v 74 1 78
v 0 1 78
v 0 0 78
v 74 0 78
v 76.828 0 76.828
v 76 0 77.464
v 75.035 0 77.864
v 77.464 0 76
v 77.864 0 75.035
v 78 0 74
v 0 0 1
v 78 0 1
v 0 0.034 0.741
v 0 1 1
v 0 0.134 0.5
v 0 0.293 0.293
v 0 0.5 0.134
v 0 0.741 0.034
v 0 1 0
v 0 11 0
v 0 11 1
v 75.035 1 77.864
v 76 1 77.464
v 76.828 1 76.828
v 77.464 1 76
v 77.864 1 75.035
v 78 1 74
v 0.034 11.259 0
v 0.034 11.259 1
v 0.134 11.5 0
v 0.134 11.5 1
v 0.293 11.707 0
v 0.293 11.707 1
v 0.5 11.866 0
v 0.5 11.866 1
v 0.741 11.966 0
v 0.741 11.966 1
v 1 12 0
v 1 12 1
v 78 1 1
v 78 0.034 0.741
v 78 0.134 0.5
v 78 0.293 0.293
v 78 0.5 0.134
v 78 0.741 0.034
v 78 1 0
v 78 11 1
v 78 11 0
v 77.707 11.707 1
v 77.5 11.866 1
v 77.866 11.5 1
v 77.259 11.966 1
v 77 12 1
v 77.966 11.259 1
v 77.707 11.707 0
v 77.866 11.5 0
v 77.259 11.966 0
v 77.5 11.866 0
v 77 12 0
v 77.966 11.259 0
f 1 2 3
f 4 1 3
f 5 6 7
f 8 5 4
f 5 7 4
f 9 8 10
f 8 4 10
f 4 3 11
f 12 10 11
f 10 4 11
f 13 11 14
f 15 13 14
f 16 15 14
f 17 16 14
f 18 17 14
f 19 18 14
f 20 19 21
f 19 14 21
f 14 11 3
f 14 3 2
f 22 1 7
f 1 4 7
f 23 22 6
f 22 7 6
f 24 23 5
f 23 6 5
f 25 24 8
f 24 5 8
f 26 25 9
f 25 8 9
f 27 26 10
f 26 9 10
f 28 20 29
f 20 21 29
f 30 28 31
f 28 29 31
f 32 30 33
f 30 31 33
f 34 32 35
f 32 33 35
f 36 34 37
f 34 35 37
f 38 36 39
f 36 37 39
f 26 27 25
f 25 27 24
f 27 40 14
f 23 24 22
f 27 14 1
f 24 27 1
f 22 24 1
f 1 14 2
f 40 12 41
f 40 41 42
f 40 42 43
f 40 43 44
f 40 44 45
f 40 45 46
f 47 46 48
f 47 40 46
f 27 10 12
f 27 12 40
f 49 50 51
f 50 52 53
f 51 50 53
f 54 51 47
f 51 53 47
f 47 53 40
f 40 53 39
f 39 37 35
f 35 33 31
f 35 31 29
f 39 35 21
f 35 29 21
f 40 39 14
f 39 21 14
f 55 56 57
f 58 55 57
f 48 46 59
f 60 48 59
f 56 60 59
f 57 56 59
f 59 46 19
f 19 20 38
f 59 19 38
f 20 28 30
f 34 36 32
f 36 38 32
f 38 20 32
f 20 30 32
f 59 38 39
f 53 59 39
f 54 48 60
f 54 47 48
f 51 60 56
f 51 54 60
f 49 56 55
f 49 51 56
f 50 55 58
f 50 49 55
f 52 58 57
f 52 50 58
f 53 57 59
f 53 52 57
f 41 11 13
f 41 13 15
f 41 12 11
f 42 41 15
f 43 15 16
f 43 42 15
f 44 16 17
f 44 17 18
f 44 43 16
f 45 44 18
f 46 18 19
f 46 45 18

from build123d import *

# Parameters (mm, degrees)
F1_DEPTH = 78
F2_R     = 4
F3_R     = 1


# Not quite as in the source:
# - two fillets or chamfers of one size are made in one step


with BuildPart() as f1:
    # F0 (on Right) → F1 (new body)
    with BuildSketch(Plane.YZ):
        Polygon((0, 78), (0, 0), (12, 0), (12, 1), (1, 1), (1, 78), align=None)
    extrude(amount=F1_DEPTH)

    # F2
    f2_edges = [f1.edges().sort_by_distance(p)[0] for p in [
        (78, 0.5, 78),
    ]]
    fillet(f2_edges, radius=F2_R)

    # F3
    f3_edges = [f1.edges().sort_by_distance(p)[0] for p in [
        (0, 12, 0.5),
        (39, 0, 0),
        (78, 12, 0.5),
    ]]
    fillet(f3_edges, radius=F3_R)


solid = f1.part
